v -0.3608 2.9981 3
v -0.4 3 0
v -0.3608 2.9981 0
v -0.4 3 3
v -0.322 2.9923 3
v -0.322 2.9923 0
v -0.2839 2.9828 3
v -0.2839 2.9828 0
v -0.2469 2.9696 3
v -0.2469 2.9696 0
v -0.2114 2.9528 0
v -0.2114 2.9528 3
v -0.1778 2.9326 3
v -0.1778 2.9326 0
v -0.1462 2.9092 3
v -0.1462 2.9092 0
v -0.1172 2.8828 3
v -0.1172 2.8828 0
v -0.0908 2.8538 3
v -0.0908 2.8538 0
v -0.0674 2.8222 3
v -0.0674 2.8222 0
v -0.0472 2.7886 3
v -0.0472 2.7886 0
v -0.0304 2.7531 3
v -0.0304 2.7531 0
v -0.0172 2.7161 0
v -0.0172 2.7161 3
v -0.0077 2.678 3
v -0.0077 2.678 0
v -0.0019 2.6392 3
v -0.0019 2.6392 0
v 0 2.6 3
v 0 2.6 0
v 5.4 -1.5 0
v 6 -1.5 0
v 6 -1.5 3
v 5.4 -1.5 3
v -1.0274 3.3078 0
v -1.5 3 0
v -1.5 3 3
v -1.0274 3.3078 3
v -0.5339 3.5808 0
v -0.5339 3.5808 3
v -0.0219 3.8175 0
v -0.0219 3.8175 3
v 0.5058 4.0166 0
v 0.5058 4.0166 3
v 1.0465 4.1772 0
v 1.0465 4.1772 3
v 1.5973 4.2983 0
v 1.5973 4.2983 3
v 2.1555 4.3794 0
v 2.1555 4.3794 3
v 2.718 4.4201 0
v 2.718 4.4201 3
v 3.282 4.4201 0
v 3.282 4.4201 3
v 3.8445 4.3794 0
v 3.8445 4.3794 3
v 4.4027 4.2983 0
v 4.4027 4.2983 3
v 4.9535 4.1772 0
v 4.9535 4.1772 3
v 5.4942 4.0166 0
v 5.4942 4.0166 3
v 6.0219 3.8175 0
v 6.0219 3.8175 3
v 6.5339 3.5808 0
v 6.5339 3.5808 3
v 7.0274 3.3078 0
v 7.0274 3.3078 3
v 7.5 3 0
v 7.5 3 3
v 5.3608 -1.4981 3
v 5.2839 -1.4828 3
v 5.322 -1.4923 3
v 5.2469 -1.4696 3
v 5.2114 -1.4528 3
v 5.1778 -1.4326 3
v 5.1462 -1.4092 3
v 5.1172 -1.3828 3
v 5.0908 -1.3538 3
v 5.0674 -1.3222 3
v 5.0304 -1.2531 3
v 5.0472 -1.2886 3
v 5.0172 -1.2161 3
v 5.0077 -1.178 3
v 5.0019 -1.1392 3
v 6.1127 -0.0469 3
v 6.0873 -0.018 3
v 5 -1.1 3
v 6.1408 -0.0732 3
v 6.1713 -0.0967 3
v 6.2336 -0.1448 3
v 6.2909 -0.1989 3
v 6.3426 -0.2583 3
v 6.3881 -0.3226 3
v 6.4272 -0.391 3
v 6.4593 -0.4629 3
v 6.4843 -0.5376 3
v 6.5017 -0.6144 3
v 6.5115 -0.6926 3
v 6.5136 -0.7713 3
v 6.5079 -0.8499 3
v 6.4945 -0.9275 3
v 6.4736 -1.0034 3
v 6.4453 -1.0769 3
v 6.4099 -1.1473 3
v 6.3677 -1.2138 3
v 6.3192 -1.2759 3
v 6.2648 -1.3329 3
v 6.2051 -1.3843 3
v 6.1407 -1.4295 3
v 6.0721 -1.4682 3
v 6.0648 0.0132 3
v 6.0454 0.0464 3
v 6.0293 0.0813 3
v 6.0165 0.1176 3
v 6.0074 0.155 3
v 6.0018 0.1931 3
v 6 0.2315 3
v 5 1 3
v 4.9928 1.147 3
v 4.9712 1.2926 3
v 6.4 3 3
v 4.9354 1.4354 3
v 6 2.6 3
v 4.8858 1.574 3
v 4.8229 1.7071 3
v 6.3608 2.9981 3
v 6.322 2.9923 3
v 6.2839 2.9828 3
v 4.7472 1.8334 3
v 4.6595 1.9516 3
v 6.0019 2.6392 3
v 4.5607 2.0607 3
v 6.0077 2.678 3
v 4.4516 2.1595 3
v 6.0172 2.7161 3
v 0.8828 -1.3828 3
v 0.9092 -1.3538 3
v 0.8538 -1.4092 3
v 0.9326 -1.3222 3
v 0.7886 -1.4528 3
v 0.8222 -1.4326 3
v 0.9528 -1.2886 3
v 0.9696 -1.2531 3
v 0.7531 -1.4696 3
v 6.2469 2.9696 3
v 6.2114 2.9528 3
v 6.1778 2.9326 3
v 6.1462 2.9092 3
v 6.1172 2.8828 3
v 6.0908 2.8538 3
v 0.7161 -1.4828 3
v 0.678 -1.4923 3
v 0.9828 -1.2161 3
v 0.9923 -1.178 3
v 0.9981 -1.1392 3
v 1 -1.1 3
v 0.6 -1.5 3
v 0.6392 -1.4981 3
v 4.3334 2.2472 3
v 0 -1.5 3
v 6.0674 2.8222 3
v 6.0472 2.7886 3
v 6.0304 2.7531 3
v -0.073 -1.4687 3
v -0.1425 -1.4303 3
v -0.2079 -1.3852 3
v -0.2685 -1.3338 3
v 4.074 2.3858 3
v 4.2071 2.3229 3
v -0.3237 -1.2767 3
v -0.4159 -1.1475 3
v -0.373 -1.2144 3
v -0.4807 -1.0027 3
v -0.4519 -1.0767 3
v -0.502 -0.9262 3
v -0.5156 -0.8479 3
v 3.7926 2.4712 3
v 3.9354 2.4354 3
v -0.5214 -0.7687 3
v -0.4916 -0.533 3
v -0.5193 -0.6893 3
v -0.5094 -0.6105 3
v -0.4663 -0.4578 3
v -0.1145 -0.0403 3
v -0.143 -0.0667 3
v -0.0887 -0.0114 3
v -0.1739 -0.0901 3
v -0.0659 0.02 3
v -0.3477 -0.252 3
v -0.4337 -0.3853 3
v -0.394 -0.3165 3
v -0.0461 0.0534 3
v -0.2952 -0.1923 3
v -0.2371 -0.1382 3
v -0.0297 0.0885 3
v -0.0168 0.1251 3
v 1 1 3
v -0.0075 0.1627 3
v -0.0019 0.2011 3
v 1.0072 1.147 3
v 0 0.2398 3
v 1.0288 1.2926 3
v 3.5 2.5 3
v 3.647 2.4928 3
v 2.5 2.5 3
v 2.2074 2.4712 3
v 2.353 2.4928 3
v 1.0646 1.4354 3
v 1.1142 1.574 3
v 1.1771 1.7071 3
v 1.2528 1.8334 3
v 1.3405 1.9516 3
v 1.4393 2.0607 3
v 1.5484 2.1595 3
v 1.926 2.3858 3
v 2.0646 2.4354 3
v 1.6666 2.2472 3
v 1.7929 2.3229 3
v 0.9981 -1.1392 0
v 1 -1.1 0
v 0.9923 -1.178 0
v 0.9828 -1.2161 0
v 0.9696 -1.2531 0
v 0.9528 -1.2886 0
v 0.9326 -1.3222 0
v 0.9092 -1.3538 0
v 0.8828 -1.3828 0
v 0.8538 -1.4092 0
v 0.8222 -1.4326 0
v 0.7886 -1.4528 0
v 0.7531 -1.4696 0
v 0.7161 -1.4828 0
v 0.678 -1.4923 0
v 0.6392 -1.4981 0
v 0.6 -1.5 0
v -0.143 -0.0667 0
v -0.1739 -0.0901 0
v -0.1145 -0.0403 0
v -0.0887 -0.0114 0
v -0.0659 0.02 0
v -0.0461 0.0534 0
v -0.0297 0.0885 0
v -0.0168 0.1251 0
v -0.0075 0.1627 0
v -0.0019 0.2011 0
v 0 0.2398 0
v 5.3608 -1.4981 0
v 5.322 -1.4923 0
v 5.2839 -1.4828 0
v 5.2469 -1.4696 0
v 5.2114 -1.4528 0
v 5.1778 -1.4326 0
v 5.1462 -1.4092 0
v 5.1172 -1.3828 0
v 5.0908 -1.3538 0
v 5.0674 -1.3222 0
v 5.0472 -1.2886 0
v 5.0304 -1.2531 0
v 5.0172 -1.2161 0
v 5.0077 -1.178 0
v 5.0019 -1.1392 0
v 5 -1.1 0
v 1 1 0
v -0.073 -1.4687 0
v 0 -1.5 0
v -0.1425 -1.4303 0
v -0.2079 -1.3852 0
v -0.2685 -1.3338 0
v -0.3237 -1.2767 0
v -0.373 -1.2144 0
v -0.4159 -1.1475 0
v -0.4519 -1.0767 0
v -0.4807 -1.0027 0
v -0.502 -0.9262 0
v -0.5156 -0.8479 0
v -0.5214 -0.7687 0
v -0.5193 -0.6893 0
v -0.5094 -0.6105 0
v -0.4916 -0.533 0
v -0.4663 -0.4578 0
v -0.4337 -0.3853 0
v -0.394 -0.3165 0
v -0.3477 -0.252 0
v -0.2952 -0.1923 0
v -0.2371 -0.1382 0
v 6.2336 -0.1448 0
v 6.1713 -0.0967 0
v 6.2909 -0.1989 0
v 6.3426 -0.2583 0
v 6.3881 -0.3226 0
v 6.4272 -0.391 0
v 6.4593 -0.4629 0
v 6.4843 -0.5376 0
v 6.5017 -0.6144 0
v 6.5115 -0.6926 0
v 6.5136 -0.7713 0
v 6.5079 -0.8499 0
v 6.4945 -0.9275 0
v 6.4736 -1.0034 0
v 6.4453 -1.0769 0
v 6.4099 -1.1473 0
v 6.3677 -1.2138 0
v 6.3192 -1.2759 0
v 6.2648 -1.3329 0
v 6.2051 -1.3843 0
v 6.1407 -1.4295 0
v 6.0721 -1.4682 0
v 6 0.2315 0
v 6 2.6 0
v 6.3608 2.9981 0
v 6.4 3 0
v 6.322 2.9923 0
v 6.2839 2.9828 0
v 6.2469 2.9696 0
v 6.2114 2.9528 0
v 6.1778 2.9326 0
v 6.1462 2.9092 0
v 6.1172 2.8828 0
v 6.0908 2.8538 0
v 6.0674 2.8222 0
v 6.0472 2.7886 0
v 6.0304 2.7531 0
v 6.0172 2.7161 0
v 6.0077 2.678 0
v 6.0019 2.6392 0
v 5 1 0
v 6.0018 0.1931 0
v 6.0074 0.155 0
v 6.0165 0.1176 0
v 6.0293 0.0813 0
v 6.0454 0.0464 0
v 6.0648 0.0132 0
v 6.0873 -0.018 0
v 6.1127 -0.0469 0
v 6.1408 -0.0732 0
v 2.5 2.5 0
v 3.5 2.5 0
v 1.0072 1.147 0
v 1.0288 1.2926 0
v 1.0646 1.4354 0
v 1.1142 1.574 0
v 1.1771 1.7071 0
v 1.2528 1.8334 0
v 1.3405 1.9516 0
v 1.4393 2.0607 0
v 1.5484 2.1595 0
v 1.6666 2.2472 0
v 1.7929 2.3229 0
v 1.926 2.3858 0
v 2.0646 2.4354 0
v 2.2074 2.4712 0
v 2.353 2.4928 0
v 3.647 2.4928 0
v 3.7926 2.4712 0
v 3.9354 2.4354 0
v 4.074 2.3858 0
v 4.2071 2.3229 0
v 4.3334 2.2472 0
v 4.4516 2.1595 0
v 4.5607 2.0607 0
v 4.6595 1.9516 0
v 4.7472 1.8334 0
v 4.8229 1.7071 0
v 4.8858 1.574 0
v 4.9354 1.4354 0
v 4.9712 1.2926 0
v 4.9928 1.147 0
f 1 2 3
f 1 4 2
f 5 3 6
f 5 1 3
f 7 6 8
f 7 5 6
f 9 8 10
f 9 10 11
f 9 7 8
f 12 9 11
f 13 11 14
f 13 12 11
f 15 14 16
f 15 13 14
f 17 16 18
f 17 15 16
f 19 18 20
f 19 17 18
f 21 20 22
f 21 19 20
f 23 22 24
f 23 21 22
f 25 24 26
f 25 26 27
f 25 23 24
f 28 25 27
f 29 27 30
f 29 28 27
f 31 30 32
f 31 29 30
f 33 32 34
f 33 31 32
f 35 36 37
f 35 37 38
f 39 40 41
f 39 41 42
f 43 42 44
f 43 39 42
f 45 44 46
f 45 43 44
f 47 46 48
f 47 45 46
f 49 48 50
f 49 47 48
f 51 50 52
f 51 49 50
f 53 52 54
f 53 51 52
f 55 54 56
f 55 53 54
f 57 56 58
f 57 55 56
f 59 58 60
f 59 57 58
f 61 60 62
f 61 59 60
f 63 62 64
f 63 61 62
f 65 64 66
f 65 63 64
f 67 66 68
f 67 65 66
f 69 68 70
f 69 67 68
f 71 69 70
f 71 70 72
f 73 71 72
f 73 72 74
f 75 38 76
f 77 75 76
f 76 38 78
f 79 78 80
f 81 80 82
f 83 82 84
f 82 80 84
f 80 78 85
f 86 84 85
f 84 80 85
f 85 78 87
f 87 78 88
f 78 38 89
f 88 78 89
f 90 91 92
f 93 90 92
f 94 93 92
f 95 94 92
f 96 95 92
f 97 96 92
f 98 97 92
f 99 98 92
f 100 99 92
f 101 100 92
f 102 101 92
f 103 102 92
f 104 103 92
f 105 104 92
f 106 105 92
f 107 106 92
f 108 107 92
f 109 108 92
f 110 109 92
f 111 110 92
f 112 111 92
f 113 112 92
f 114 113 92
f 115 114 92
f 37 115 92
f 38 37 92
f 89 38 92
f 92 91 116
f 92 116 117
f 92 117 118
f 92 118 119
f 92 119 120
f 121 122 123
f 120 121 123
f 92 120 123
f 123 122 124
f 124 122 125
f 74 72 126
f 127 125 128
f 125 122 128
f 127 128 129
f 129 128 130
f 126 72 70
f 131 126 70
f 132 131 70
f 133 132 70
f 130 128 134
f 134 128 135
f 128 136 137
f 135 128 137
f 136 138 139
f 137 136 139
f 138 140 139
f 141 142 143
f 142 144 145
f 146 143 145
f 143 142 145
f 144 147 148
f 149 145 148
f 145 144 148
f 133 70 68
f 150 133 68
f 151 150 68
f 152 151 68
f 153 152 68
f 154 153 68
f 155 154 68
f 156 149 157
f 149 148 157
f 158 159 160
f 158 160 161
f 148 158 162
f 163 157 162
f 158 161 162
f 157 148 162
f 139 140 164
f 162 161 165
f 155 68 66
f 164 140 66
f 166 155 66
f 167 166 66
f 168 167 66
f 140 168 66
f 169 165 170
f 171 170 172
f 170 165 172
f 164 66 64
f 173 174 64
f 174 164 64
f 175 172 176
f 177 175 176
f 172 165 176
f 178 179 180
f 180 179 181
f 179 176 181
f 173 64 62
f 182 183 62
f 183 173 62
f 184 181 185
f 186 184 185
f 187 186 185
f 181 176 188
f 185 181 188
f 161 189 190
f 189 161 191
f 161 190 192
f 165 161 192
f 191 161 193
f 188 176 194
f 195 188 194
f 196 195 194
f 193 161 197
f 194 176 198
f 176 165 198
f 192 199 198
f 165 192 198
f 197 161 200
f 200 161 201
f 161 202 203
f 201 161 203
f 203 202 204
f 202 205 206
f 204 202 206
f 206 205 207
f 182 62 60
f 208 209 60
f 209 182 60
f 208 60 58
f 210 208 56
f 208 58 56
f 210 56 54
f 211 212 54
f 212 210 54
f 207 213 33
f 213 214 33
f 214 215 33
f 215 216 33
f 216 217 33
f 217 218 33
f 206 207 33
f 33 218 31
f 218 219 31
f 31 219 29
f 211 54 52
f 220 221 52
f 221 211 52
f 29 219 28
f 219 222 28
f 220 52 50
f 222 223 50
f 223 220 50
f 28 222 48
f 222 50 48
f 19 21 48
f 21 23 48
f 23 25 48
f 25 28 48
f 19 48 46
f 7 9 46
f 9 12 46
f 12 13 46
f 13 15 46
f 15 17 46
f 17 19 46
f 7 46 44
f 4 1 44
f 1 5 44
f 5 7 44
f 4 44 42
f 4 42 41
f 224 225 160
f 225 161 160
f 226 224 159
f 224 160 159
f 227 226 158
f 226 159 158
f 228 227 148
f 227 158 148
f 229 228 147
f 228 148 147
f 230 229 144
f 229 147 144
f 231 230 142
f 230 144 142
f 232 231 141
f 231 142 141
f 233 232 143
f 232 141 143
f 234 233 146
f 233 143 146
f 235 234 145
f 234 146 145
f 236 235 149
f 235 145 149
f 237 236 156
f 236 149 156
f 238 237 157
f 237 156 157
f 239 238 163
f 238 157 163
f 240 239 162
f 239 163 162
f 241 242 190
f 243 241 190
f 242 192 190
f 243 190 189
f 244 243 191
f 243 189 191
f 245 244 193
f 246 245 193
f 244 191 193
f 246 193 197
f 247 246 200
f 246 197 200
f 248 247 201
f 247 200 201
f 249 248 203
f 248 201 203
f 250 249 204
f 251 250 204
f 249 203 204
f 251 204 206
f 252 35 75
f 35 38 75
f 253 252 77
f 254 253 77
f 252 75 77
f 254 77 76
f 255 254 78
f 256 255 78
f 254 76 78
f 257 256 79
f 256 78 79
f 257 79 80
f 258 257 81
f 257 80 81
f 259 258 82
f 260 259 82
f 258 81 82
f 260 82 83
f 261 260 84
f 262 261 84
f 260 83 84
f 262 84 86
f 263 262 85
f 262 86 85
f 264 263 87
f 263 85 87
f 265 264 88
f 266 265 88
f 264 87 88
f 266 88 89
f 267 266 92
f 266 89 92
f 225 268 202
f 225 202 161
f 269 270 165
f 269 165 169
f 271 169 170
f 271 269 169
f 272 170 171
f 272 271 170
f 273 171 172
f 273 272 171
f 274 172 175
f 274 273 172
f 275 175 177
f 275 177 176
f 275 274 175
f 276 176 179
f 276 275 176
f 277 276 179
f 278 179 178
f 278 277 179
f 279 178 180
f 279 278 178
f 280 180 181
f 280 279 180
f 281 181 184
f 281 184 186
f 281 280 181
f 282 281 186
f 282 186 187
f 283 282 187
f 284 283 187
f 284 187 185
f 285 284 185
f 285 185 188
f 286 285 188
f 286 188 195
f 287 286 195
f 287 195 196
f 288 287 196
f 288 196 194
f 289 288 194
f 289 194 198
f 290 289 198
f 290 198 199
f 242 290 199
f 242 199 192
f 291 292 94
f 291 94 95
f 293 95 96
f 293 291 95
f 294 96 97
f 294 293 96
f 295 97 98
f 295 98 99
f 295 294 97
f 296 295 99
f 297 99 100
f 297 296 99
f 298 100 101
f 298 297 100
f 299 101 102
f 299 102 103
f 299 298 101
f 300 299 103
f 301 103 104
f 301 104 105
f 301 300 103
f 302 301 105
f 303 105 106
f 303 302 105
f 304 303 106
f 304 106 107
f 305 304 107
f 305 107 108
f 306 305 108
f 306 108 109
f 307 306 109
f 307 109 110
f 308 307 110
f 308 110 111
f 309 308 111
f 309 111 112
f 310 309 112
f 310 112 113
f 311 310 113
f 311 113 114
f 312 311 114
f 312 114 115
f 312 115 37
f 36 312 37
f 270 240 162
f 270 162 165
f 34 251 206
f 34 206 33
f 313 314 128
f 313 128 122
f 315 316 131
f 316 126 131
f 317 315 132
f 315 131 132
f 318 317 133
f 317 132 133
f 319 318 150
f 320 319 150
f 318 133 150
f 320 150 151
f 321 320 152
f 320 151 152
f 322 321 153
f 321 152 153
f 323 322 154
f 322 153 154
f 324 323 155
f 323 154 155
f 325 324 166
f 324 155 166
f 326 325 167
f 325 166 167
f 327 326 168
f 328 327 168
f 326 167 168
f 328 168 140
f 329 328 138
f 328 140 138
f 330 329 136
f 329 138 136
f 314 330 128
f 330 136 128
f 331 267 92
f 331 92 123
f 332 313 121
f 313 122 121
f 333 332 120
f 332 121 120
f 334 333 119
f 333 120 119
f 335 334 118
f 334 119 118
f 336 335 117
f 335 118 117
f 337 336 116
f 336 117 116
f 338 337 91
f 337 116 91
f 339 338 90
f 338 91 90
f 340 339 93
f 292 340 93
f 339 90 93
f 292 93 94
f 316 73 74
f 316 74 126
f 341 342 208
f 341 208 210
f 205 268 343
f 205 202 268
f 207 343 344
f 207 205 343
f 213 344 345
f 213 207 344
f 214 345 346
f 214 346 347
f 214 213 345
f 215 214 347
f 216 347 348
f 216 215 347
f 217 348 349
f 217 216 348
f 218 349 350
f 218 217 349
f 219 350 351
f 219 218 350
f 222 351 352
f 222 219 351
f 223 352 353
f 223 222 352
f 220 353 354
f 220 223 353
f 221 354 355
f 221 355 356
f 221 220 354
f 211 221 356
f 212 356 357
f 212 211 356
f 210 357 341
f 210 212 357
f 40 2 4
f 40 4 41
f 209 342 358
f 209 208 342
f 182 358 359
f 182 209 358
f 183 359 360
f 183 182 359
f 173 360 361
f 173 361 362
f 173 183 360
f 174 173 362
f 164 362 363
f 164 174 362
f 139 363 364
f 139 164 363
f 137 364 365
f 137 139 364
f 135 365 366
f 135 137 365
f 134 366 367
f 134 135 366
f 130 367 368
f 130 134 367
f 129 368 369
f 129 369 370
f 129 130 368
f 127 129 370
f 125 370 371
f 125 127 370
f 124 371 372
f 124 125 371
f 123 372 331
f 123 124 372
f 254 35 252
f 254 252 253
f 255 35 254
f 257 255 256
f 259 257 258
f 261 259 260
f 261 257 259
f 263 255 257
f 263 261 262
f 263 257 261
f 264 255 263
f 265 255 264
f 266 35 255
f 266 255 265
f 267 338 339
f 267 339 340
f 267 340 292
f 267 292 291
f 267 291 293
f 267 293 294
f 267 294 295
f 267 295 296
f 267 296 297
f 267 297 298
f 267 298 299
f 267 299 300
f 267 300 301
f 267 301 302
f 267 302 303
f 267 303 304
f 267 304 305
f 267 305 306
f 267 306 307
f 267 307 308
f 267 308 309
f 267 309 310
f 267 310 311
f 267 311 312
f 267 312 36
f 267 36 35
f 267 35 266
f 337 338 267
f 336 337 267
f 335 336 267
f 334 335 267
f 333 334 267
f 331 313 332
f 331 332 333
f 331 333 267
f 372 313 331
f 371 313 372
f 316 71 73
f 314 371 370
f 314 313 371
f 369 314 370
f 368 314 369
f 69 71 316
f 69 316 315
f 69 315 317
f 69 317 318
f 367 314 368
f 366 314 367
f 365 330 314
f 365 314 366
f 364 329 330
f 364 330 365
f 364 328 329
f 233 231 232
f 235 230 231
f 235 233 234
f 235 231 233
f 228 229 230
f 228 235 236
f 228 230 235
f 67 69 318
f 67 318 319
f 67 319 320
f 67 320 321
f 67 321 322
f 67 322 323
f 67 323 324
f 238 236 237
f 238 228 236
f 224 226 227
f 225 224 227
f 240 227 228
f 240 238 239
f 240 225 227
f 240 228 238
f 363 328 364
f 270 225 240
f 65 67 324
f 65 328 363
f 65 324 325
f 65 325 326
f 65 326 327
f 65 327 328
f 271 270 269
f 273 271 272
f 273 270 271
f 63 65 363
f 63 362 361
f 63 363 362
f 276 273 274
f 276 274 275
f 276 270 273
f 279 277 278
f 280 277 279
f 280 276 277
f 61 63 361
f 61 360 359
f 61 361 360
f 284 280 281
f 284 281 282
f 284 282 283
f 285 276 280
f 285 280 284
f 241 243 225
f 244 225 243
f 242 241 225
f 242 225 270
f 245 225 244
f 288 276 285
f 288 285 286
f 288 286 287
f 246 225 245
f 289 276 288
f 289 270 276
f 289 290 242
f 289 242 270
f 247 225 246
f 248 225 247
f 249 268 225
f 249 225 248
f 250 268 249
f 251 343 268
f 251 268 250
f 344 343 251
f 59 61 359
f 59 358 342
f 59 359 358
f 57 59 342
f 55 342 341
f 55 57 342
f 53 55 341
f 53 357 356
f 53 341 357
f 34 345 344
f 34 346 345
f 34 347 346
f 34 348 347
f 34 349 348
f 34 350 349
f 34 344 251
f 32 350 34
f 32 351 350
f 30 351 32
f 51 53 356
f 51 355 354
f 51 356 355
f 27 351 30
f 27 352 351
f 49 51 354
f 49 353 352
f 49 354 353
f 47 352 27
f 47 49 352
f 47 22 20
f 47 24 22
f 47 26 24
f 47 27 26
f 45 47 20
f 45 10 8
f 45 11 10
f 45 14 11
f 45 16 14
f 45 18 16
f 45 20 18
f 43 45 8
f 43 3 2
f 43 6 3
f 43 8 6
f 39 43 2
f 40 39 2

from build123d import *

# Parameters (mm, degrees)
DODANIE_WYCI_GNI_CIE1_DEPTH = 3
ZAOKR_GLENIE2_R             = 0.4
ZAOKR_GLENIE3_R             = 1.5


with BuildPart() as part:
    # Szkic1 → Dodanie-wyciągnięcie1 (new body)
    with BuildSketch(Plane.XY):
        with BuildLine():
            Line((0, 3), (-1.5, 3))
            ThreePointArc((-1.5, 3), (3, 4.425195836), (7.5, 3))
            Line((7.5, 3), (6, 3))
            Line((6, 3), (6, -0.005902175))
            ThreePointArc((6, -0.005902175), (6.513786929, -0.752951087), (6, -1.5))
            Line((6, -1.5), (5, -1.5))
            Line((5, -1.5), (5, 2.5))
            Line((5, 2.5), (1, 2.5))
            Line((1, 2.5), (1, -1.5))
            Line((1, -1.5), (0, -1.5))
            ThreePointArc((0, -1.5), (-0.521611782, -0.75), (0, 0))
            Line((0, 0), (0, 3))
        make_face()
    extrude(amount=DODANIE_WYCI_GNI_CIE1_DEPTH)

    # Zaokrąglenie2
    zaokr_glenie2_edges = [part.edges().sort_by_distance(p)[0] for p in [
        (0, 0, 1.5),
        (0, 3, 1.5),
        (6, 3, 1.5),
        (6, -0.005902175, 1.5),
        (5, -1.5, 1.5),
        (1, -1.5, 1.5),
    ]]
    fillet(zaokr_glenie2_edges, radius=ZAOKR_GLENIE2_R)

    # Zaokrąglenie3
    zaokr_glenie3_edges = [part.edges().sort_by_distance(p)[0] for p in [
        (5, 2.5, 1.5),
        (1, 2.5, 1.5),
    ]]
    fillet(zaokr_glenie3_edges, radius=ZAOKR_GLENIE3_R)


solid = part.part
